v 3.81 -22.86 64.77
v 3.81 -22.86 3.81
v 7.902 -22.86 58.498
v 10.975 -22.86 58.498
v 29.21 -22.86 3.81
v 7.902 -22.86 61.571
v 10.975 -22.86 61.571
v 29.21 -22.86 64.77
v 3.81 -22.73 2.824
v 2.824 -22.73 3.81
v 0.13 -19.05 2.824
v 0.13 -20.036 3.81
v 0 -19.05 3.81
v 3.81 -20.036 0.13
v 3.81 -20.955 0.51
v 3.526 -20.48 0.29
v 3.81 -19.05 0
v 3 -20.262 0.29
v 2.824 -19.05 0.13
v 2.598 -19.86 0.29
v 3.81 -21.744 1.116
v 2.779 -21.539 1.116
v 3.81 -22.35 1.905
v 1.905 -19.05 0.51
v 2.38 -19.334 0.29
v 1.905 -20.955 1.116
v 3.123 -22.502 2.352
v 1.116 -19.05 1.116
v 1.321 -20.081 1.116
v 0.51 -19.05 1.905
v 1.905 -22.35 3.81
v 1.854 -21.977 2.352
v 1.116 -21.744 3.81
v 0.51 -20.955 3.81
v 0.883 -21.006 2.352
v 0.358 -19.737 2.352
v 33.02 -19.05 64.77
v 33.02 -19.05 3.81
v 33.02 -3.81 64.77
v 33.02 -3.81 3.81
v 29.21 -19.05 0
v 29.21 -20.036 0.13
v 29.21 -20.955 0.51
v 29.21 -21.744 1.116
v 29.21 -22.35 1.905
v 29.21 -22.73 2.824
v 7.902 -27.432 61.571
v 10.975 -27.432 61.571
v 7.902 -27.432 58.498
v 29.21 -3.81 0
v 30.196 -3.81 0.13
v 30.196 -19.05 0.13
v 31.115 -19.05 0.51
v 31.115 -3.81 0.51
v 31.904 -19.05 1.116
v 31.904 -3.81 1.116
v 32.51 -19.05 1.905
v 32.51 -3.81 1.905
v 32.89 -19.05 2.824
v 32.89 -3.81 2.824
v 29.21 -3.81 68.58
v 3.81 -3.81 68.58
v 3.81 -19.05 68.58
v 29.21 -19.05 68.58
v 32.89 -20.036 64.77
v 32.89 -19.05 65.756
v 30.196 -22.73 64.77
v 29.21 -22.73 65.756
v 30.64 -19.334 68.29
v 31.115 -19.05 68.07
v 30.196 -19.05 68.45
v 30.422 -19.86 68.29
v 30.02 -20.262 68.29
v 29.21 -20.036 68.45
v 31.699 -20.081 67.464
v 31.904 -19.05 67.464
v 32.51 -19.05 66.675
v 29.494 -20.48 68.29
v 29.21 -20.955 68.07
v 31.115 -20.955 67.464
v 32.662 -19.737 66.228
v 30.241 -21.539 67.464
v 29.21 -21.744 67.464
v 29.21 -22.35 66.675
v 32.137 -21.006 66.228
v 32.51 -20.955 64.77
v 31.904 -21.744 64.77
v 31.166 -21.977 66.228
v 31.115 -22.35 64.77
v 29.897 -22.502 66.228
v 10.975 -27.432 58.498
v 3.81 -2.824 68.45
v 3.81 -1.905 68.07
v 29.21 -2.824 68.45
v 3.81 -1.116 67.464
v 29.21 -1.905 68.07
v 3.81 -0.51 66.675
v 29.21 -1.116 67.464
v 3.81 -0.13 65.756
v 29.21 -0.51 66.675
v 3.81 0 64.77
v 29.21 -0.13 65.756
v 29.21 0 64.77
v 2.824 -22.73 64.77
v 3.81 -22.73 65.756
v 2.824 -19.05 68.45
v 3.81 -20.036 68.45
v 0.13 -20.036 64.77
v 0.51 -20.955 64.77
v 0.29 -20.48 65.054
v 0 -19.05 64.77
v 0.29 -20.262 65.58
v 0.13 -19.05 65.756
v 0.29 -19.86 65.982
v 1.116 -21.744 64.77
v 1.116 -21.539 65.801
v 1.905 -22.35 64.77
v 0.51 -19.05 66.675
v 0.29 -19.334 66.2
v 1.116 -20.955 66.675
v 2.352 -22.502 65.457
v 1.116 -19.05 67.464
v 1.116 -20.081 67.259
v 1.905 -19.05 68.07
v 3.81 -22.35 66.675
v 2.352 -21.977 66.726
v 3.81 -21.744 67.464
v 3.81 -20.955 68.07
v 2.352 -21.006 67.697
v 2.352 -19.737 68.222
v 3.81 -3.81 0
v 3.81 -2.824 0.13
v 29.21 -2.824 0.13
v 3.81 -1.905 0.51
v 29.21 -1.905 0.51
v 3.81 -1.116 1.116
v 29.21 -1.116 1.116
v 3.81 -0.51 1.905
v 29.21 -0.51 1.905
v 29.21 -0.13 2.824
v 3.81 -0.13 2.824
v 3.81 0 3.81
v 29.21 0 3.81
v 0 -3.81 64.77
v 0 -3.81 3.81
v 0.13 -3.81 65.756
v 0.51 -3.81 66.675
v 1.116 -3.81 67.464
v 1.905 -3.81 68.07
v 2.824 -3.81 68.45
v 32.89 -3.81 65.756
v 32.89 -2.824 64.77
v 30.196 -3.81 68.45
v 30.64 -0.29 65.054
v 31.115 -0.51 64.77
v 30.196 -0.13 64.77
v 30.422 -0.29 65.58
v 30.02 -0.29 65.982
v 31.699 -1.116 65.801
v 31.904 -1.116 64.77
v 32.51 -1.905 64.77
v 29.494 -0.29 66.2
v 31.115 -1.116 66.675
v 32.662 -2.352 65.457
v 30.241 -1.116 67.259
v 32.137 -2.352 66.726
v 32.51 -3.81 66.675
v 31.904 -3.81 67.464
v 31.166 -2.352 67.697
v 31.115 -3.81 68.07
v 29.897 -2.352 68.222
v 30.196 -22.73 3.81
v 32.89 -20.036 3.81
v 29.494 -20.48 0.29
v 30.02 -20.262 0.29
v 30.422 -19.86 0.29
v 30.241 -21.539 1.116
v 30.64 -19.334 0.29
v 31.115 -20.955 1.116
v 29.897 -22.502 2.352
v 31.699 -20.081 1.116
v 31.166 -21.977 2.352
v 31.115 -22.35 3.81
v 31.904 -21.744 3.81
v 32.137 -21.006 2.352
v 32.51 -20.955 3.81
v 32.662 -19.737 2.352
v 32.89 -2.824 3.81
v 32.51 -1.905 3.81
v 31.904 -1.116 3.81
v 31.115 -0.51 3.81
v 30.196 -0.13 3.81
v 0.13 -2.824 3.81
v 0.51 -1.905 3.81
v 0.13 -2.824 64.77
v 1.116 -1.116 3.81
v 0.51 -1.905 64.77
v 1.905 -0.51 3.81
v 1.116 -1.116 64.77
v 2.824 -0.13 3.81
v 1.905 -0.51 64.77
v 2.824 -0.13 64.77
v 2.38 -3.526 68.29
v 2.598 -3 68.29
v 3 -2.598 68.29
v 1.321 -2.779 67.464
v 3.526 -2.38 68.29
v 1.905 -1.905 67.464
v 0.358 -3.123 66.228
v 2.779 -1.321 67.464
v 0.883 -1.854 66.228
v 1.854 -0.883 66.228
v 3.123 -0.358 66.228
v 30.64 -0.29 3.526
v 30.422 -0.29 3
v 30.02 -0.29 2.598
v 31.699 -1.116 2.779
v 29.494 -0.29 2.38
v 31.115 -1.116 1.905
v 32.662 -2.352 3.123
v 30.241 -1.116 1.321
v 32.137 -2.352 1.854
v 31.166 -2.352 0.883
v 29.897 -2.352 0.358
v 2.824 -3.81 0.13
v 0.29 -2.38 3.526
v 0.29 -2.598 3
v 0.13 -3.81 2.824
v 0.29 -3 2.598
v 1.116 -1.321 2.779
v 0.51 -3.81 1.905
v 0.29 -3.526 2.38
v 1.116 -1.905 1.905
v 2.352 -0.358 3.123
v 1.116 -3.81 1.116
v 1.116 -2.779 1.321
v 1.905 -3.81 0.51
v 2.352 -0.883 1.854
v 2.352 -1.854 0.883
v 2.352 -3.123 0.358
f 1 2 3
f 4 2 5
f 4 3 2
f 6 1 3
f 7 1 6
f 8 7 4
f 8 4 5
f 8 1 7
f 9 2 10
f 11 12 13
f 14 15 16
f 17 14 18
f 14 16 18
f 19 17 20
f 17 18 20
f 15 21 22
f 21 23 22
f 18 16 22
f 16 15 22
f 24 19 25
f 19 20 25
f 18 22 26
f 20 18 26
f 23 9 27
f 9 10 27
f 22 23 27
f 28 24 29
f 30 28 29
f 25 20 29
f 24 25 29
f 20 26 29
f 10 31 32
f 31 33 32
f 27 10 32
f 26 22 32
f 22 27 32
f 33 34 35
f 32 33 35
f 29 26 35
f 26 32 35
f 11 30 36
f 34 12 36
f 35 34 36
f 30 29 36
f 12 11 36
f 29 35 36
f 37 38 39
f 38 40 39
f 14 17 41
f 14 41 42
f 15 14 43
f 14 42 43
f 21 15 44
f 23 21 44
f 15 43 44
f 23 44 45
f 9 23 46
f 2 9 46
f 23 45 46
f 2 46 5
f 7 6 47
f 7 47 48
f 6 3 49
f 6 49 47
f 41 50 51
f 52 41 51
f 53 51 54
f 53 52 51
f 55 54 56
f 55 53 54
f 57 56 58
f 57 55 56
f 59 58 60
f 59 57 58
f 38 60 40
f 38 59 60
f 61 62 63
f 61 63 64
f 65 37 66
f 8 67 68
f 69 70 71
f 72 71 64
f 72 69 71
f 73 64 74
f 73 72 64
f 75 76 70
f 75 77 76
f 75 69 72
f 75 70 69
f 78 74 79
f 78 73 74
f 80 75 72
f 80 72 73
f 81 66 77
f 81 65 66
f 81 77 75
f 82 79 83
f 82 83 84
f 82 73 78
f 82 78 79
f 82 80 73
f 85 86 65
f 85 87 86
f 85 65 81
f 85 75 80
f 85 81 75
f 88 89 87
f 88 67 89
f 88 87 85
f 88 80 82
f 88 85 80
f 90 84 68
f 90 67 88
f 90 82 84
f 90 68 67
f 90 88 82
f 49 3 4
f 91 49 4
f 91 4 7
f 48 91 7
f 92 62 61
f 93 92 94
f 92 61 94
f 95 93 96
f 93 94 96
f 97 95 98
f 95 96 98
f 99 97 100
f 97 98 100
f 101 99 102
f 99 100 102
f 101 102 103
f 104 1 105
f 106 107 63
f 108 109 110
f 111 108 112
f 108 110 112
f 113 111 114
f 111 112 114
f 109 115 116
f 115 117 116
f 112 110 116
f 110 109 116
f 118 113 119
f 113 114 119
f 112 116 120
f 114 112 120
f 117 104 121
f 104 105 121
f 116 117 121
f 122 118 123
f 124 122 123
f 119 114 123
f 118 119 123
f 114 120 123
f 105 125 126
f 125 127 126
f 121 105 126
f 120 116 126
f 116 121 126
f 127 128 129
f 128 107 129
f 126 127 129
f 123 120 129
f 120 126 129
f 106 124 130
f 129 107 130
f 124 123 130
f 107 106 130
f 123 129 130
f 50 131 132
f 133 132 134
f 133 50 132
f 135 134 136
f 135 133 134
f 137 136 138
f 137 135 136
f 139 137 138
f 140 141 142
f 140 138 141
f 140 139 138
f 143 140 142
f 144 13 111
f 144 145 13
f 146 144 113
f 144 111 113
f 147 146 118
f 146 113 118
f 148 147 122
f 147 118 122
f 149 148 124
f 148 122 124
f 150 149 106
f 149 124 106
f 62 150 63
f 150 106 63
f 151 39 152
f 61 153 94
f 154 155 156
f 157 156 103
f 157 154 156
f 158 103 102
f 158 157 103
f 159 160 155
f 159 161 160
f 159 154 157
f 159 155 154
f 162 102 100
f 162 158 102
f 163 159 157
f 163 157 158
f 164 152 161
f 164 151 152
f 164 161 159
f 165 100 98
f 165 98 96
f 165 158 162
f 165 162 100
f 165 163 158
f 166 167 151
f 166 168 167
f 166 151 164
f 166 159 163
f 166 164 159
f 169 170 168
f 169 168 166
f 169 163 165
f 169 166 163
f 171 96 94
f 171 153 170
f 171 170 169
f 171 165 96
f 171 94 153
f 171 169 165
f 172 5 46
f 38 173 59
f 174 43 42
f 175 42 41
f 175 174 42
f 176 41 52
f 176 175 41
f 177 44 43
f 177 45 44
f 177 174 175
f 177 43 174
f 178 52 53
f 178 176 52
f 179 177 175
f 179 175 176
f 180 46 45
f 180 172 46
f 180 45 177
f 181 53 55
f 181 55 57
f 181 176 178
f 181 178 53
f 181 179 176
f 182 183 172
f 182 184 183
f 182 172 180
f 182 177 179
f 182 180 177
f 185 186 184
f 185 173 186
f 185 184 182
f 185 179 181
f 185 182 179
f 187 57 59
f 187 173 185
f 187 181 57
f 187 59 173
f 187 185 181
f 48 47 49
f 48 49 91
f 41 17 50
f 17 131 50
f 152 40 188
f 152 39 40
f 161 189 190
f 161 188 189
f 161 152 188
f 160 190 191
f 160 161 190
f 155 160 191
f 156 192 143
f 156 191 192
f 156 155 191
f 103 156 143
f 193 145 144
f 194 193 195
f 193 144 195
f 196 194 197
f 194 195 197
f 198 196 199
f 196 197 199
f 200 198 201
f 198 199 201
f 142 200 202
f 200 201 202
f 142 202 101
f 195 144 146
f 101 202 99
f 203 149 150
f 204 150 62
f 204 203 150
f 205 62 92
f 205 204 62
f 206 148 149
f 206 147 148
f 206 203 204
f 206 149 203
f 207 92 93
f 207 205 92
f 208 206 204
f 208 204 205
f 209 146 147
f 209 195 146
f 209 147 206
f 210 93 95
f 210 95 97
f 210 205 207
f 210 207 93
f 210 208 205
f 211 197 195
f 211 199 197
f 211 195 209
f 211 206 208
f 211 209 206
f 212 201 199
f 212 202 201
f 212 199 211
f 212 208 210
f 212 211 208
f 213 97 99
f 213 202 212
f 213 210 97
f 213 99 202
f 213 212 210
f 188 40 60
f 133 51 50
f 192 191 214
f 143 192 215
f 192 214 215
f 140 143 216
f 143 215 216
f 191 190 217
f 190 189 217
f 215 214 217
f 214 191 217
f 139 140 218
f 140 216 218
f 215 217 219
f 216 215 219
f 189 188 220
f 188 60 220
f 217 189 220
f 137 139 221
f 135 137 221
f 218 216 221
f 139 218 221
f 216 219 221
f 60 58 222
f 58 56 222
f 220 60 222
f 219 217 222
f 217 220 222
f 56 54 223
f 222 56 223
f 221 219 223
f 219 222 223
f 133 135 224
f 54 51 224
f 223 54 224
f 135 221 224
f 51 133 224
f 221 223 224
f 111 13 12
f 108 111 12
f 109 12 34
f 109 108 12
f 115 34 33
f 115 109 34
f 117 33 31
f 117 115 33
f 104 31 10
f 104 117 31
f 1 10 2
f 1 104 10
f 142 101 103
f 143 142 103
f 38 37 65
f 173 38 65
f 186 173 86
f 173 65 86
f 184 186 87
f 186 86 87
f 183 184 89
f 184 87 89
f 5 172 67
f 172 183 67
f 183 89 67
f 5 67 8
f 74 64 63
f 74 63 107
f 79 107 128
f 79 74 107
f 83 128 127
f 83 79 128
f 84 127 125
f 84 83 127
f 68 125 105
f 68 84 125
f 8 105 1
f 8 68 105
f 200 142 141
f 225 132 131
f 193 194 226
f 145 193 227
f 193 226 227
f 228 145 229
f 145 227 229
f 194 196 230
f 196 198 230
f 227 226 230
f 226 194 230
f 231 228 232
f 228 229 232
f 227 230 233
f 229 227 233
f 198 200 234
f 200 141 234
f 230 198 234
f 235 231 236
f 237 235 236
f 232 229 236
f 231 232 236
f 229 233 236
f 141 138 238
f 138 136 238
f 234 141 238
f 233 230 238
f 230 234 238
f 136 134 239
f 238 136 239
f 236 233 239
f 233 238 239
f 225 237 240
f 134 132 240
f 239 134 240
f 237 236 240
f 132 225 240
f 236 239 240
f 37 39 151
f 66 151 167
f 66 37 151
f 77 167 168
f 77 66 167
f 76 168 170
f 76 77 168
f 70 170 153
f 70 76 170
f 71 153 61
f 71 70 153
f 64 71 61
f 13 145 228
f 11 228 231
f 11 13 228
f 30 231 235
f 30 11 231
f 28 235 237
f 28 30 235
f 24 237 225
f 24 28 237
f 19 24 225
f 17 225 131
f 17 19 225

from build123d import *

# Parameters (mm, degrees)
F0_W     = 33.02
F0_H     = 68.58
F1_DEPTH = 22.86
F2_R     = 3.81
F3_W     = 3.073085
F3_H     = 3.073089
F4_DEPTH = 4.572


with BuildPart() as f1:
    # F0 (on Front) → F1 (new body)
    with BuildSketch(Plane.XZ):
        with Locations((16.51, 34.29)):
            Rectangle(F0_W, F0_H)
    extrude(amount=F1_DEPTH)

    # F2
    f2_edges = [f1.edges().sort_by_distance(p)[0] for p in [
        (33.02, -22.86, 34.29),
        (33.02, -11.43, 68.58),
        (16.51, -22.86, 68.58),
        (0, -22.86, 34.29),
        (16.51, -22.86, 0),
        (33.02, -11.43, 0),
        (33.02, 0, 34.29),
        (16.51, 0, 0),
        (0, 0, 34.29),
        (0, -11.43, 68.58),
        (0, -11.43, 0),
        (16.51, 0, 68.58),
    ]]
    fillet(f2_edges, radius=F2_R)

    # F3 (on face) → F4 (join)
    with BuildSketch(Plane.XZ.offset(22.86)):
        with Locations((9.438765, 60.034938)):
            Rectangle(F3_W, F3_H)
    extrude(amount=F4_DEPTH)


solid = f1.part
